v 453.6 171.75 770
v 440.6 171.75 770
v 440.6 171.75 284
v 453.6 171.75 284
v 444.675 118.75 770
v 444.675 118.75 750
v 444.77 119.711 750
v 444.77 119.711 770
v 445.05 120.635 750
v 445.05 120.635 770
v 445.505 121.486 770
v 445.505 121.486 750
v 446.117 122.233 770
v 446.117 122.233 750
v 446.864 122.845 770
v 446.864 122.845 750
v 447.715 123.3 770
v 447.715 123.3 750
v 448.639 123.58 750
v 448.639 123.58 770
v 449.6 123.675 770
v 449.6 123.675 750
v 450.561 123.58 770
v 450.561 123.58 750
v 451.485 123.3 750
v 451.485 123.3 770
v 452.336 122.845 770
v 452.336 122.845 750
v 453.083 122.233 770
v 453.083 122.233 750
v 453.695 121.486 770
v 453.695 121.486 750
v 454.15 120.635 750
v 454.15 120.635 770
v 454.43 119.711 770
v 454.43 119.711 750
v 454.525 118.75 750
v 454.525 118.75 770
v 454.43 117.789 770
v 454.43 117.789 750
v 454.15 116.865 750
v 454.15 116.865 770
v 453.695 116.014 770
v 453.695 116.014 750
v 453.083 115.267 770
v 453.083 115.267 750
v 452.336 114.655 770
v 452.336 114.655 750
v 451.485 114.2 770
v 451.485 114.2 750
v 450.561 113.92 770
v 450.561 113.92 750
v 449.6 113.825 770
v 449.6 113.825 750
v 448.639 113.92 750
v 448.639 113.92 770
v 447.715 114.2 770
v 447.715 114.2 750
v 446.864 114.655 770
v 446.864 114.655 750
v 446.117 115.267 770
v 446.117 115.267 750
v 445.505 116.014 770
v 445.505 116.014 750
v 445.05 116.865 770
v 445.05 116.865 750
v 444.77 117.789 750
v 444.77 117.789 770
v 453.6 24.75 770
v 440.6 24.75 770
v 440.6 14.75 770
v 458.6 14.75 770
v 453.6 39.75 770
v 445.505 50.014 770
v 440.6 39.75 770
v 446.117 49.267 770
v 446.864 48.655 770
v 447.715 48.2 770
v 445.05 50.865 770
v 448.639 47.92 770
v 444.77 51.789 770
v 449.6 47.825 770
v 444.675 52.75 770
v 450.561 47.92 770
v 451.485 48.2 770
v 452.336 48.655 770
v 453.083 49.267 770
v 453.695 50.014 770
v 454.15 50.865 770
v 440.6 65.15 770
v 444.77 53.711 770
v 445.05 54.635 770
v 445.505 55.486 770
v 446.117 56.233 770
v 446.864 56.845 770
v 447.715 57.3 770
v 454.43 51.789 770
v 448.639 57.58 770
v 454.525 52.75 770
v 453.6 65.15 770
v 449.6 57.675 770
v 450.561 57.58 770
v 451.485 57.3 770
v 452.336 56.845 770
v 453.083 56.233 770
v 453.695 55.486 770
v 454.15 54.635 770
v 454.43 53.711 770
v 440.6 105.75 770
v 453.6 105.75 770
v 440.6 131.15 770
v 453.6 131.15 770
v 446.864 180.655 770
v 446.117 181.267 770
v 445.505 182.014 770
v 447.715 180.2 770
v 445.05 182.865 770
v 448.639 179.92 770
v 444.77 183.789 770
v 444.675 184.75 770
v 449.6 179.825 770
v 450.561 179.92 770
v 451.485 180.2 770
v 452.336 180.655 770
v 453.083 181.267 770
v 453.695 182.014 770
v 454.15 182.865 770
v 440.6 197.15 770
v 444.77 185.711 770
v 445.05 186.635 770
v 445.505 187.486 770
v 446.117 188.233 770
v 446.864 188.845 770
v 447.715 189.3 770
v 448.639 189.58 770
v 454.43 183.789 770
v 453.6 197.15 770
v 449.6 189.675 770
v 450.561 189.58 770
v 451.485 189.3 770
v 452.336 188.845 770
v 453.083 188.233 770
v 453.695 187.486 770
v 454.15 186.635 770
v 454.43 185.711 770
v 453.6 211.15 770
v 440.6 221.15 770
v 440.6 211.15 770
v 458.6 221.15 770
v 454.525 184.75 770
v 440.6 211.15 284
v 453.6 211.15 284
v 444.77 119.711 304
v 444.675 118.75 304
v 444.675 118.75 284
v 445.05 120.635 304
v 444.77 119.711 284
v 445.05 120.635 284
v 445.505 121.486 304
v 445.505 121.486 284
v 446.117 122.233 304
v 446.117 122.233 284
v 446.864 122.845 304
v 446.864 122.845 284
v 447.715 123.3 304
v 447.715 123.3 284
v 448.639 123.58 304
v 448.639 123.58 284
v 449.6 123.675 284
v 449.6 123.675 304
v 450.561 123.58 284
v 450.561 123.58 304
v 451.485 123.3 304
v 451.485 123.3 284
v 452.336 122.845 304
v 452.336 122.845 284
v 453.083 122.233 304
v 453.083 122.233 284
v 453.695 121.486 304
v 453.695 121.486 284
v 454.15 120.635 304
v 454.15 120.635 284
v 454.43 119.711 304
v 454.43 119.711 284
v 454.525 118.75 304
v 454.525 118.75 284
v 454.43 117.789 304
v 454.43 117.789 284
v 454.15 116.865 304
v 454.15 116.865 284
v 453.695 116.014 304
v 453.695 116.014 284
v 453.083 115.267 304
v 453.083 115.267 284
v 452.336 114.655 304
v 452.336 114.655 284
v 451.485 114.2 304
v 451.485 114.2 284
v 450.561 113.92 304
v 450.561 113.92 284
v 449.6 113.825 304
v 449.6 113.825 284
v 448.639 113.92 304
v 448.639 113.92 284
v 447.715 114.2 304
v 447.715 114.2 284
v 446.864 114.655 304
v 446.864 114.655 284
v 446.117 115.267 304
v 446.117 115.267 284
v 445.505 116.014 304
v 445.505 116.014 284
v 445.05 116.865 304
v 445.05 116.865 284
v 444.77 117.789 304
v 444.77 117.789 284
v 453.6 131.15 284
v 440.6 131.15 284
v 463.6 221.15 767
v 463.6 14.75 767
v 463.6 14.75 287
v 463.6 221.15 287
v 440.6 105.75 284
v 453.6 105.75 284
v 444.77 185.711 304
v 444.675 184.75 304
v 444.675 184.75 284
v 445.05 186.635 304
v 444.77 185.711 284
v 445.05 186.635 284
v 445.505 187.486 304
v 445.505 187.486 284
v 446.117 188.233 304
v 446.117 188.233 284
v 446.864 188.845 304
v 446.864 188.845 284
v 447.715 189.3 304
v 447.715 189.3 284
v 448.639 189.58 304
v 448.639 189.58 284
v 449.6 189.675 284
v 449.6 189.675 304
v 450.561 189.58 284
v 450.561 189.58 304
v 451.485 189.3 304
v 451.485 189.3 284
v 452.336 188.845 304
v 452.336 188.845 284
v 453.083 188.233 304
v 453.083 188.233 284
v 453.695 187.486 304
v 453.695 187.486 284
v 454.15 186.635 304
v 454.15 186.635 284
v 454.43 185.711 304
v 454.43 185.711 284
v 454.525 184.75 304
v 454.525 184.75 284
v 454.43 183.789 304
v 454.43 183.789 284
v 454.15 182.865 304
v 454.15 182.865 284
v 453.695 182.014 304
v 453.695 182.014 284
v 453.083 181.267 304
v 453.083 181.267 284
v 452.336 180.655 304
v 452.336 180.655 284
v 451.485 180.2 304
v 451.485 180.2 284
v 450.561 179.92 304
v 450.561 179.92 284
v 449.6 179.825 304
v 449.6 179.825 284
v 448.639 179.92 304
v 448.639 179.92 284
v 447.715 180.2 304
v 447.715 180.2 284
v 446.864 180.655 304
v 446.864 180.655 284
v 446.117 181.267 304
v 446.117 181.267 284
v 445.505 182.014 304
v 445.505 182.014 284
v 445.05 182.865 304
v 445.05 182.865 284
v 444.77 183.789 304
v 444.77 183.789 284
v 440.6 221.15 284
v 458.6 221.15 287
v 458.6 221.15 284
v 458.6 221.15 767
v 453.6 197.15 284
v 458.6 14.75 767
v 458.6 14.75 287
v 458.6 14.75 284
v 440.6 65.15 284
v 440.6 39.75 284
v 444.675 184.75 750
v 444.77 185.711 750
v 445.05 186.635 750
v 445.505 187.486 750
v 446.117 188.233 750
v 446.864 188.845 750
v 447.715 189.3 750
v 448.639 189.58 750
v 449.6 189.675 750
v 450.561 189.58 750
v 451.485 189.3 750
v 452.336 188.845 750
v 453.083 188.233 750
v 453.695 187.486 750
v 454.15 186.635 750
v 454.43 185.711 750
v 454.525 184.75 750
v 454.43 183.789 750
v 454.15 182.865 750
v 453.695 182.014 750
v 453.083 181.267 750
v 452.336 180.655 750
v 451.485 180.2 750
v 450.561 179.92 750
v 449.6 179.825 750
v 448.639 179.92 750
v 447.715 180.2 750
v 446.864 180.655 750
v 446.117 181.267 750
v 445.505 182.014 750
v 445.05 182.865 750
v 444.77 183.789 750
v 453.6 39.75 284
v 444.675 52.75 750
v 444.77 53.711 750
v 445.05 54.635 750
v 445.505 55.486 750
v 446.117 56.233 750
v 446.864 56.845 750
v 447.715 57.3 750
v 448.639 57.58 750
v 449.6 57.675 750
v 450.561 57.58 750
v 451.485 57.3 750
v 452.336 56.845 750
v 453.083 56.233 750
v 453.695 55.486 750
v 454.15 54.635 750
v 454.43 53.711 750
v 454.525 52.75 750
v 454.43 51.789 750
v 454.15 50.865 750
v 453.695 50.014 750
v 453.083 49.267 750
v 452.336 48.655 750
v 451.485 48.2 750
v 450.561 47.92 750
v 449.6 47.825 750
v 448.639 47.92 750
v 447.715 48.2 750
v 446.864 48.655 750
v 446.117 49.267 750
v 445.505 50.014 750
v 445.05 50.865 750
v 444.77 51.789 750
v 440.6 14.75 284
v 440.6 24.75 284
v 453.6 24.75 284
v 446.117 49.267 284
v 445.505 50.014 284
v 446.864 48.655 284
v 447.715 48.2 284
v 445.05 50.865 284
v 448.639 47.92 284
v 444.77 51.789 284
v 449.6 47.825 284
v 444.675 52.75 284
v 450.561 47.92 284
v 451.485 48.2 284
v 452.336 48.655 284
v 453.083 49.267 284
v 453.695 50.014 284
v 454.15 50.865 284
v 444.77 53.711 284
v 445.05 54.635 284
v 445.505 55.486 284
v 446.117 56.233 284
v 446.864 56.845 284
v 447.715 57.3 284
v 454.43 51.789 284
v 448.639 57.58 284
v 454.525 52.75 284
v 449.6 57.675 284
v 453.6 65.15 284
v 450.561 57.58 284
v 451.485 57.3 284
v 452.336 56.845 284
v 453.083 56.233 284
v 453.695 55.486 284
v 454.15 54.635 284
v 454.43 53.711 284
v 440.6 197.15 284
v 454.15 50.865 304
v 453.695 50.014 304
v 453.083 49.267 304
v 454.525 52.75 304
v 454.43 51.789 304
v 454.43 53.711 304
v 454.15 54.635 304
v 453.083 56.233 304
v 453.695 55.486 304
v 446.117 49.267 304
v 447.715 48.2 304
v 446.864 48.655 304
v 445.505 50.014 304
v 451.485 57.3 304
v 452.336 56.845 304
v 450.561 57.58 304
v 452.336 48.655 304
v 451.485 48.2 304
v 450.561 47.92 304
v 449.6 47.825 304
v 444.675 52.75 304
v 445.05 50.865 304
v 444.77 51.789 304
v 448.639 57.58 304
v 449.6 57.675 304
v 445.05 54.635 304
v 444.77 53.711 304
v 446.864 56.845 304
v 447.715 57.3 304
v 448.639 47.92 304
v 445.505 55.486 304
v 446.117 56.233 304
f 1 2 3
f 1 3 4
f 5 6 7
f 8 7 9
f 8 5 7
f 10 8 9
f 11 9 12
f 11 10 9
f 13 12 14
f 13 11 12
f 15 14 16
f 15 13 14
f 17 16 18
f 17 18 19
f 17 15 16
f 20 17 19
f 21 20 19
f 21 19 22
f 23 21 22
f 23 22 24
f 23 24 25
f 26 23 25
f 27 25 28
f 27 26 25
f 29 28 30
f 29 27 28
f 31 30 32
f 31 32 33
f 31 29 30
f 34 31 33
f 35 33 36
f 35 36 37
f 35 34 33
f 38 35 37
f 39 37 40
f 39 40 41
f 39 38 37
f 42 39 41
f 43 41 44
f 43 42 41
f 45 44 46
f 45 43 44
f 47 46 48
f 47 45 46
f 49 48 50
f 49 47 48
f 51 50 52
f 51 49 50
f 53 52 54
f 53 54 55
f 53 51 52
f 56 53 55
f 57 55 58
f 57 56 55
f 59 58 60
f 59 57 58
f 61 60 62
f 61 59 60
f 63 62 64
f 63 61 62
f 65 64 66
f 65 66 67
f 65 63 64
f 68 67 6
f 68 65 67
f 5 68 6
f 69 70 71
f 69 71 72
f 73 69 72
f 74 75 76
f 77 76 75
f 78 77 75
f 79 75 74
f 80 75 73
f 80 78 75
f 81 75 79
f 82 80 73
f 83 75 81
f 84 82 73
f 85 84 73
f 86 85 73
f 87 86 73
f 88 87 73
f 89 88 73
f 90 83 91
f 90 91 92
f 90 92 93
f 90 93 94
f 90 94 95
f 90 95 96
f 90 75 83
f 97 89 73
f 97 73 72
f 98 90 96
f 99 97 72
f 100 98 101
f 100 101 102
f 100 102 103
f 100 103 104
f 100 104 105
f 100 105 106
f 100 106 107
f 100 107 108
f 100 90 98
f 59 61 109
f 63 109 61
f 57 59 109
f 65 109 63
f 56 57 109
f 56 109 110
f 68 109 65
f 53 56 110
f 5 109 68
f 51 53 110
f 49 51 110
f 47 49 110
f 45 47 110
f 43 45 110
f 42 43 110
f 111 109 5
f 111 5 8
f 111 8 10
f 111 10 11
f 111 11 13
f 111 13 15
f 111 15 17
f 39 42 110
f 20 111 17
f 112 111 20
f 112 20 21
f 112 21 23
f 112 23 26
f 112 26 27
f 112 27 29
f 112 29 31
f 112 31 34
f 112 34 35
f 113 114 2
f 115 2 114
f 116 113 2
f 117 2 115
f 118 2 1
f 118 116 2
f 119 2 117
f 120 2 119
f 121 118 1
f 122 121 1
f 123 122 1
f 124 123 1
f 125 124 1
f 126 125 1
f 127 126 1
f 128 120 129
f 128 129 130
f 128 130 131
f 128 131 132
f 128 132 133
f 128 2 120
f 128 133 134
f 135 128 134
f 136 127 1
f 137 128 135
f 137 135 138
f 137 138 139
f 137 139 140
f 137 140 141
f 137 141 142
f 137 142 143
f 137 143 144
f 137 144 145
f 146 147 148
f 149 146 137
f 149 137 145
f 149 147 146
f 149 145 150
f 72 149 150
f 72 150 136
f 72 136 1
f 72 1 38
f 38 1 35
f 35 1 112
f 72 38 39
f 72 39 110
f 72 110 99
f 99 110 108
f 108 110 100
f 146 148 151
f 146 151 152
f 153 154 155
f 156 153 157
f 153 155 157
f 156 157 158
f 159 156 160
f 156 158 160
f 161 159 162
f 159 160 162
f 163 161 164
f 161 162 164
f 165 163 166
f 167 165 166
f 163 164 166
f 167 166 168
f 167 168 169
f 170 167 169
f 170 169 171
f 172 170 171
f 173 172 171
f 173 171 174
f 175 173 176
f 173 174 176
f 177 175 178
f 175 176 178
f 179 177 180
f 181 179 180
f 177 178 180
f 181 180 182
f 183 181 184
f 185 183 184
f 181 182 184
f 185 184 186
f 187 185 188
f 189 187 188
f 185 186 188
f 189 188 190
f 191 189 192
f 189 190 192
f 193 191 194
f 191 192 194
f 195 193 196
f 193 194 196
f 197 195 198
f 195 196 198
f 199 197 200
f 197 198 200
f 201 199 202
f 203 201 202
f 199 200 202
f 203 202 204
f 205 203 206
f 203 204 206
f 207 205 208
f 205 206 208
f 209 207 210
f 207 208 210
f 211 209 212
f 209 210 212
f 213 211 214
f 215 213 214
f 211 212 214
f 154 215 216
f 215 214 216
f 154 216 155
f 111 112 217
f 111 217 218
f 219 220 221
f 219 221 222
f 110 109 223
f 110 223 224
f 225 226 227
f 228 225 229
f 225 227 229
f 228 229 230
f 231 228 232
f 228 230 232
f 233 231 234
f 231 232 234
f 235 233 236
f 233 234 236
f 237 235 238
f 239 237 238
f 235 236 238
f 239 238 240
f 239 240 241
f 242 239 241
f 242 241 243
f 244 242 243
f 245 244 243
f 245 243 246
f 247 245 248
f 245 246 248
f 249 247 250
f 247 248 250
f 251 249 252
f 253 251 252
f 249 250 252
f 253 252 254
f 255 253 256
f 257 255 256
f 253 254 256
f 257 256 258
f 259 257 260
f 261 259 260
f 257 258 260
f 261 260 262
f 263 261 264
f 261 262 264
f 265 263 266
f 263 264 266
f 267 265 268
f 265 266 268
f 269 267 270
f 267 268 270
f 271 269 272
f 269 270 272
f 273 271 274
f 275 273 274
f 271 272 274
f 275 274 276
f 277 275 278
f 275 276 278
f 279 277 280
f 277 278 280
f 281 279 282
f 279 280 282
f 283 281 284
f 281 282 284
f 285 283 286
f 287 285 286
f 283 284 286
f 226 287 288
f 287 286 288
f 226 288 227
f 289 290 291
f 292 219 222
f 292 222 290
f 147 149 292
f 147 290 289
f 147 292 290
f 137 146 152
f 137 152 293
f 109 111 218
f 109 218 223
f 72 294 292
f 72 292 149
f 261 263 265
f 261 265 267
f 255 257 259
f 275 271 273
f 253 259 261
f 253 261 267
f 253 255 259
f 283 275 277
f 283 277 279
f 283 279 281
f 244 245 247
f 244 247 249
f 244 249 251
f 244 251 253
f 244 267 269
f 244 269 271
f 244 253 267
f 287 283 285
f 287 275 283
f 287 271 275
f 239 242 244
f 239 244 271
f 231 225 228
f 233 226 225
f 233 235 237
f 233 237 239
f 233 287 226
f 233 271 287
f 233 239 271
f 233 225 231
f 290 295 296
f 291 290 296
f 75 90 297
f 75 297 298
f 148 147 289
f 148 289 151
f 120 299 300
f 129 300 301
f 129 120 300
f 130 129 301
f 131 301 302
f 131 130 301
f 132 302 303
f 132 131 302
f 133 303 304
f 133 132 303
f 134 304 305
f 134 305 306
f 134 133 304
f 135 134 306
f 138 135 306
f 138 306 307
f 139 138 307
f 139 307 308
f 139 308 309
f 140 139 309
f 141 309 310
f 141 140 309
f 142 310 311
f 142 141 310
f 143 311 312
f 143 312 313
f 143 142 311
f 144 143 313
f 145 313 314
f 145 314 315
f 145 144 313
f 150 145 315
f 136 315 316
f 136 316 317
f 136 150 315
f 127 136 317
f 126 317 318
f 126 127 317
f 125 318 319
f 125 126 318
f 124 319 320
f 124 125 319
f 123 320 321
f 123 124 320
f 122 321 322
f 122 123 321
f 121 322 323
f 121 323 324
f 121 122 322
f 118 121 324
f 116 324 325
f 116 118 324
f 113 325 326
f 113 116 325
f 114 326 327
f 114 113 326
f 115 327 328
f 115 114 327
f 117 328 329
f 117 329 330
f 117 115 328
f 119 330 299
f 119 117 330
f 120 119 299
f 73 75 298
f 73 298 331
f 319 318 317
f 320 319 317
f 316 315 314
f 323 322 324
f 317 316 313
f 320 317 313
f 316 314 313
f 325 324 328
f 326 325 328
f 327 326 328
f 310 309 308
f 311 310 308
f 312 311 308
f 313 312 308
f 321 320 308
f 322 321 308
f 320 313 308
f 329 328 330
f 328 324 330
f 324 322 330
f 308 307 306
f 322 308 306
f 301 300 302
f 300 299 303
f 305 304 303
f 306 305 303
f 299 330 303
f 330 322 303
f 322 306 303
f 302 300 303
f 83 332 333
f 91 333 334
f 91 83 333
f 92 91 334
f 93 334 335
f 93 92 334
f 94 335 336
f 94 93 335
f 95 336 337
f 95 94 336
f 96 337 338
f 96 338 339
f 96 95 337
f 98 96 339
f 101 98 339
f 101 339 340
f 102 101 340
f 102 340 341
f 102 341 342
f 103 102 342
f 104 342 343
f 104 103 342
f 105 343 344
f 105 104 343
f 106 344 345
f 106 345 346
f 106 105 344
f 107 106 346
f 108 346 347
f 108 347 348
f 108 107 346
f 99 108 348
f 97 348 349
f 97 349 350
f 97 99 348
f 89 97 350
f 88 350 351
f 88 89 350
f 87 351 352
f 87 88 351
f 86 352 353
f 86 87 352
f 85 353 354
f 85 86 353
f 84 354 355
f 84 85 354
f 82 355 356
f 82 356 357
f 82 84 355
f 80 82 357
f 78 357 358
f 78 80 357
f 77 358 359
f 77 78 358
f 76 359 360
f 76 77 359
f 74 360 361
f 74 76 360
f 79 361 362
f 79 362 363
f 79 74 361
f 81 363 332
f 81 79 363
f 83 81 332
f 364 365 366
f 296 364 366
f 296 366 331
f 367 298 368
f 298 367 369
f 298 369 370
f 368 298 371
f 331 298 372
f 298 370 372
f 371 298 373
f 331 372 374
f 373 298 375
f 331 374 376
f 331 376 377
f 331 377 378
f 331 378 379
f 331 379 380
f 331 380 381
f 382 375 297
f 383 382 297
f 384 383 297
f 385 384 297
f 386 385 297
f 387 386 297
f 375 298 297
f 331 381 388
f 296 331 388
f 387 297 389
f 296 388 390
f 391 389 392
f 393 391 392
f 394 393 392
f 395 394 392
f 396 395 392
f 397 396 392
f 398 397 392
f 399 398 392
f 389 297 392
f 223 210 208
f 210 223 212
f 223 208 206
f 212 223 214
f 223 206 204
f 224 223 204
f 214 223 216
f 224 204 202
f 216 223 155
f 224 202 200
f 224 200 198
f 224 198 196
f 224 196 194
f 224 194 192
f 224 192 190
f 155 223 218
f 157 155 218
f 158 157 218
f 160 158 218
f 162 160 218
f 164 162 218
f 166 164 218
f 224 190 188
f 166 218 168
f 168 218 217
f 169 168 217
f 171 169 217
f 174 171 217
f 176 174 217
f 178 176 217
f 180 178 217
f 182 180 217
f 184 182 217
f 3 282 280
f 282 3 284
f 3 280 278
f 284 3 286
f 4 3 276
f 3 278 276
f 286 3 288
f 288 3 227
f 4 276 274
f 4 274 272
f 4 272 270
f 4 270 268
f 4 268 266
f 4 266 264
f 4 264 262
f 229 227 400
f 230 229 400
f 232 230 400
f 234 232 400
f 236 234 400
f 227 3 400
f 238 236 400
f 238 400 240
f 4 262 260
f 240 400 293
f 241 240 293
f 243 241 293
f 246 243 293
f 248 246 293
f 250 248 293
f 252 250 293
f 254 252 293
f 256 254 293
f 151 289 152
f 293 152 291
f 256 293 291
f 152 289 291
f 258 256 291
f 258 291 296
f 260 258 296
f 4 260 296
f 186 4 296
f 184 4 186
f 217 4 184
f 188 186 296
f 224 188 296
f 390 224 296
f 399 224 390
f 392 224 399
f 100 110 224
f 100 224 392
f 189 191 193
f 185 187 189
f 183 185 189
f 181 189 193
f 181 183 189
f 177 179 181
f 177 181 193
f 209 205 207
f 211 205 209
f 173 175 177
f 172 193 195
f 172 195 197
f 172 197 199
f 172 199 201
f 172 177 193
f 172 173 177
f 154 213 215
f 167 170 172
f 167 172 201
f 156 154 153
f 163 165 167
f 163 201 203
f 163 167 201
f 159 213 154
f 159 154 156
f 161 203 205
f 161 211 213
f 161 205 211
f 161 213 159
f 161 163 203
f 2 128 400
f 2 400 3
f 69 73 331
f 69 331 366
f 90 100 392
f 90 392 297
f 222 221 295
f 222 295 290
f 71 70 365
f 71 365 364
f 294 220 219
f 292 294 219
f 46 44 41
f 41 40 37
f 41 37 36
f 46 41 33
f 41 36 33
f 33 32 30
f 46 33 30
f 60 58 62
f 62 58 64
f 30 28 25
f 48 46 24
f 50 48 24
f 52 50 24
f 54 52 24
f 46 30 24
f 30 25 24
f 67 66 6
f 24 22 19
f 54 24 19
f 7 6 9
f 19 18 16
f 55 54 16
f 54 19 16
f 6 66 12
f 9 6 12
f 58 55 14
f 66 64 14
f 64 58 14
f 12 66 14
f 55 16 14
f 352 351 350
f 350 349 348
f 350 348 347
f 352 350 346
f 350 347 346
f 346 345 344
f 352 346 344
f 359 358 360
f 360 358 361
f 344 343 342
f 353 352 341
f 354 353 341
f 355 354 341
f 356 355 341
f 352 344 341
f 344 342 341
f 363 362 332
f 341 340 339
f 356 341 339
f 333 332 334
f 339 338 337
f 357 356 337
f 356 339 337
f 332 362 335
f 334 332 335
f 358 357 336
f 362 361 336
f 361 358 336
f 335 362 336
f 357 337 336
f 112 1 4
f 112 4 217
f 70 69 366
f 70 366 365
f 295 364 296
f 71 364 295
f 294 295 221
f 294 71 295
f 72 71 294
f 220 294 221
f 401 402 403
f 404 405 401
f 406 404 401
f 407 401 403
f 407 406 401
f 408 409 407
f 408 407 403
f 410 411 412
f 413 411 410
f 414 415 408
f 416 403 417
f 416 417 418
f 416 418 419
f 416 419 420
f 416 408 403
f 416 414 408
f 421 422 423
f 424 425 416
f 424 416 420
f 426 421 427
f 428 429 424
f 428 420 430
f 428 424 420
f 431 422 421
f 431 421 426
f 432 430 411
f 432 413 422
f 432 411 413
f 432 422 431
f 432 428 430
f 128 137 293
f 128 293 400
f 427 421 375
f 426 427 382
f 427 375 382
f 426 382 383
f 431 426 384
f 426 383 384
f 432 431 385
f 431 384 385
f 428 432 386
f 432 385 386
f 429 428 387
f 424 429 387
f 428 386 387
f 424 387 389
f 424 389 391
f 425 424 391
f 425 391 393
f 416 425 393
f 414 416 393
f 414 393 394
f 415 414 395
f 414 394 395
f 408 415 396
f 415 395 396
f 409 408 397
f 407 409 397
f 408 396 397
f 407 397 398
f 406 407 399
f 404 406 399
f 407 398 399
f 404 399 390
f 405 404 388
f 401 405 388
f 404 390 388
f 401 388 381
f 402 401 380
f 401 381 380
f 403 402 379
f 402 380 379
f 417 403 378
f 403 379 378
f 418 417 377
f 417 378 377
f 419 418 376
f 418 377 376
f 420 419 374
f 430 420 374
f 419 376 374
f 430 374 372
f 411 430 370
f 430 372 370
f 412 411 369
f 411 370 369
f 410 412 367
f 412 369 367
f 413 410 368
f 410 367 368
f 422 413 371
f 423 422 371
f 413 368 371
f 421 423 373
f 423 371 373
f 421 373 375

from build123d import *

# Parameters (mm, degrees)
PAD014_DEPTH    = 243
SKETCH010_R     = 4.925
POCKET_DEPTH    = 20
SKETCH013_W     = 3
SKETCH013_H     = 207
POCKET001_DEPTH = 5


with BuildPart() as part:
    # Sketch009 → Pad014 (new body)
    with BuildSketch(Plane.XY):
        Polygon((0, 206.4), (0, 196.4), (13, 196.4), (13, 182.4), (0, 182.4), (0, 157), (13, 157), (13, 116.4), (0, 116.4), (0, 91), (13, 91), (13, 50.4), (0, 50.4), (0, 25), (13, 25), (13, 10), (0, 10), (0, 0), (23, 0), (23, 206.4), align=None)
    extrude(amount=PAD014_DEPTH)

    # Sketch010 (on Vertex37 of Pad014) → Pocket (cut)
    with BuildSketch(Plane(origin=(23, 0, 0), x_dir=(-1, 0, 0), z_dir=(0, 0, -1))):
        with Locations((14, 104)):
            Circle(SKETCH010_R)
        with Locations((14, 170)):
            Circle(SKETCH010_R)
        with Locations((14, 38)):
            Circle(SKETCH010_R)
    extrude(amount=-POCKET_DEPTH, mode=Mode.SUBTRACT)

    # Sketch013 (on Face6 of Pocket) → Pocket001 (cut)
    with BuildSketch(Plane(origin=(23, 0, 0), x_dir=(0, 0, -1), z_dir=(1, 0, 0))):
        with Locations((-1.5, 103.5)):
            Rectangle(SKETCH013_W, SKETCH013_H)
    extrude(amount=-POCKET001_DEPTH, mode=Mode.SUBTRACT)

    # Mirrored: part across face of Pocket


with BuildPart() as part_1:
    add(part.part)
    add(part.part.mirror(Plane(origin=(13.661045, 103.34943, 243), x_dir=(1, 0, 0), z_dir=(0, 0, 1))))


with BuildPart() as part_2:
    # Body010 placement: moved
    add(part_1.part.moved(Location((440.6, 14.75, 284))))


solid = part_2.part
